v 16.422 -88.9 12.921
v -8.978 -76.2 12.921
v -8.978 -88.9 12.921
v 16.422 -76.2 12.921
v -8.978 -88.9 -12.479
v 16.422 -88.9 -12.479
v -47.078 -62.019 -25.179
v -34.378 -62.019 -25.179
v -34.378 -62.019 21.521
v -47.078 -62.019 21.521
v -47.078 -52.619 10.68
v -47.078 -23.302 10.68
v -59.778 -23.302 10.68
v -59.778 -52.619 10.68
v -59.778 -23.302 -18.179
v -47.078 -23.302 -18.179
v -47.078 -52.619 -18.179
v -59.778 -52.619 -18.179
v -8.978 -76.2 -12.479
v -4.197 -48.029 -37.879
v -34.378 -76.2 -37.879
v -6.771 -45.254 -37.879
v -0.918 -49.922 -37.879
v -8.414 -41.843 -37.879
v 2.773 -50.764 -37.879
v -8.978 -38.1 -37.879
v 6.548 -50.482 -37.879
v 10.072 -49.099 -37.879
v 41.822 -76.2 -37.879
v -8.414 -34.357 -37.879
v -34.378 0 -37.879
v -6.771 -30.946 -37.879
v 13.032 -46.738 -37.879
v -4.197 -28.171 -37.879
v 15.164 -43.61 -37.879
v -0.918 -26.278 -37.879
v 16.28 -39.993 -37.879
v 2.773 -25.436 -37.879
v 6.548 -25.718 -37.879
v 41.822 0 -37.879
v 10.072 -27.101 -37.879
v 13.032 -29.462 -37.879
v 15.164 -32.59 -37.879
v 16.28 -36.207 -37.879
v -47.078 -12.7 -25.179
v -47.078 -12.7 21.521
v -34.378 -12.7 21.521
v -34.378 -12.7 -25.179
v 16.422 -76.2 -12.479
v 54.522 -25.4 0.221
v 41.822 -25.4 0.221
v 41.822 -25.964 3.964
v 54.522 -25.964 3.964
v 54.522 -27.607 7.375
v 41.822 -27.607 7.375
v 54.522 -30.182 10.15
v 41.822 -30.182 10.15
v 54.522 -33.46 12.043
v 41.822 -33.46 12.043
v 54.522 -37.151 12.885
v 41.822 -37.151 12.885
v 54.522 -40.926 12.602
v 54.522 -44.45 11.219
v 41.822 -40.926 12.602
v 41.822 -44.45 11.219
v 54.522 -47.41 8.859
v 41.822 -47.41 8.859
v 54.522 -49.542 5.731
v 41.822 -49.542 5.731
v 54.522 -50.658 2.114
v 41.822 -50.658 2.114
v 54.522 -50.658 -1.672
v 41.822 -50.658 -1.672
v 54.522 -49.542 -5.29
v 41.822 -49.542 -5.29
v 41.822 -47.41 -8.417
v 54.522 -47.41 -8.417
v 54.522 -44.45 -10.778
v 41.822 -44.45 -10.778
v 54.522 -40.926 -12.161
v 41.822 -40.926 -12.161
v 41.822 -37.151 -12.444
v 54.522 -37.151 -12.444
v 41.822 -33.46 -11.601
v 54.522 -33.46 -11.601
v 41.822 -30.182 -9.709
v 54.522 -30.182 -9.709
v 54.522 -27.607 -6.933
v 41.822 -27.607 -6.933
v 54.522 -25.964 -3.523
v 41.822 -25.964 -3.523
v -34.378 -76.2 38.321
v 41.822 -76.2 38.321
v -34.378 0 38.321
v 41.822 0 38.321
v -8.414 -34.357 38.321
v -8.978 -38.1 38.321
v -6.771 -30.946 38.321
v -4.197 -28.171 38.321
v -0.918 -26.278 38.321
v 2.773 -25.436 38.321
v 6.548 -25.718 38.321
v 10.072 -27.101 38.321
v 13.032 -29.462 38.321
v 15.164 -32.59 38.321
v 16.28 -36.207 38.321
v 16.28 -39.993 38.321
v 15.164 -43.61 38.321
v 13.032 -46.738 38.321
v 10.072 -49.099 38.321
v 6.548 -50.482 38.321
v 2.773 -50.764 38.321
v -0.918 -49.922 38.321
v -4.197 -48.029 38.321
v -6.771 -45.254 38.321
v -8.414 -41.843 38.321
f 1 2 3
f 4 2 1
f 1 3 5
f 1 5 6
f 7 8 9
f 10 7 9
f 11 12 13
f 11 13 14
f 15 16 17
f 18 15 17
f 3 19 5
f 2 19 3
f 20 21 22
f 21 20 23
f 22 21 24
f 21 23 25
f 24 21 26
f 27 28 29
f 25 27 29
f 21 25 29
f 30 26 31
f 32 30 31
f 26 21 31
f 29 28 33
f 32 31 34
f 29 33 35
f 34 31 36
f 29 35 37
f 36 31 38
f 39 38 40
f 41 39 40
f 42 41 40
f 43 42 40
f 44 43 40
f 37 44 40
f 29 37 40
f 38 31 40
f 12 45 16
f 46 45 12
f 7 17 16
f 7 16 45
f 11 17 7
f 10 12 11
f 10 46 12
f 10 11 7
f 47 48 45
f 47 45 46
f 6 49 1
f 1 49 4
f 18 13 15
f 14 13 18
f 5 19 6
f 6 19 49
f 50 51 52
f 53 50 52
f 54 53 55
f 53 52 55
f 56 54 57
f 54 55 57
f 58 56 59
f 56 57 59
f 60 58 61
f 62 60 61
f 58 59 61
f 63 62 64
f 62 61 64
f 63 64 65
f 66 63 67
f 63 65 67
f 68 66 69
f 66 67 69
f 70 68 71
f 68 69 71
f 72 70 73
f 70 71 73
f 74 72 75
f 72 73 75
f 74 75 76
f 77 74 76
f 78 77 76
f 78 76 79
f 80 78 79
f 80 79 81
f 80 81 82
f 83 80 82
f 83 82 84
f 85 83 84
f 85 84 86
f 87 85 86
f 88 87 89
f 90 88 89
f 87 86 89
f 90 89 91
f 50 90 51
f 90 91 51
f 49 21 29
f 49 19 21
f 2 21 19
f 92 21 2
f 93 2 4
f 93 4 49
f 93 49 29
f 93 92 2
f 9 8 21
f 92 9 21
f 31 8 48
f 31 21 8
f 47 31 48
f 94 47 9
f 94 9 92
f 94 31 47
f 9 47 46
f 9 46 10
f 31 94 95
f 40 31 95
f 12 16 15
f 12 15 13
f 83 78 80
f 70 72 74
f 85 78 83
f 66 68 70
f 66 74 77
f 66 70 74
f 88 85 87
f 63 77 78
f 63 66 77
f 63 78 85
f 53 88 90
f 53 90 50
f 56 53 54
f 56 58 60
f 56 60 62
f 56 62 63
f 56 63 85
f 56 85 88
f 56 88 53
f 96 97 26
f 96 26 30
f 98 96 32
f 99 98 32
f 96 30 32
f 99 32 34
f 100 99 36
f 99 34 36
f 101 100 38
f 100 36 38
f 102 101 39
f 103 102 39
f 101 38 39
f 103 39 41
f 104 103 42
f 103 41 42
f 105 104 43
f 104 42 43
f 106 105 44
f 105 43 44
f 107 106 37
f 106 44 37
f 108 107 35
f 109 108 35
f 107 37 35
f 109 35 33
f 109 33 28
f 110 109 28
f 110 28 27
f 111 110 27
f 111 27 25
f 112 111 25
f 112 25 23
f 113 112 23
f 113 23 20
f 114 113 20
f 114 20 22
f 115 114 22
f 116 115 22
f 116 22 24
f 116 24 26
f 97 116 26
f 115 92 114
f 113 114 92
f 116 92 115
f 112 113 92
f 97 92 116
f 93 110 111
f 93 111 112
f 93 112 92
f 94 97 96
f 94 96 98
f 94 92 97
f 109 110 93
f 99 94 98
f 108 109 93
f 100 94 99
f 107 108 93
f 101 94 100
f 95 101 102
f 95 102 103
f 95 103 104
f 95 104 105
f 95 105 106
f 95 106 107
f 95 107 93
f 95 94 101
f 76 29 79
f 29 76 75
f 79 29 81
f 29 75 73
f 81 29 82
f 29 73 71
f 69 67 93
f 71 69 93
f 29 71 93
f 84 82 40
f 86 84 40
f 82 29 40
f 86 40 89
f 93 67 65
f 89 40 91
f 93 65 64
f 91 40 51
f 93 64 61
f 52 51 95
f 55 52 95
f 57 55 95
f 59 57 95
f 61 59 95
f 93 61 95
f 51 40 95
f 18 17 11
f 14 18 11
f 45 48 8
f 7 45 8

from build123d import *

# Parameters (mm, degrees)
F0_W      = 76.2
F0_H      = 76.2
F1_DEPTH  = 76.2
F2_W      = 25.4
F2_H      = 25.4
F3_DEPTH  = 12.7
F4_R      = 12.7
F5_DEPTH  = 12.7
F7_D      = 25.4
F8_W      = 49.319143
F8_H      = 46.700371
F9_DEPTH  = 12.7
F10_W     = 29.316643
F10_H     = 28.858568
F11_DEPTH = 12.7


with BuildPart() as f1:
    # F0 (on Front) → F1 (new body)
    with BuildSketch(Plane.XZ):
        with Locations((3.721774, 0.220706)):
            Rectangle(F0_W, F0_H)
    extrude(amount=F1_DEPTH)

    # F2 (on face) → F3 (join)
    with BuildSketch(Plane.XZ.offset(76.2)):
        with Locations((3.721774, 0.220706)):
            Rectangle(F2_W, F2_H)
    extrude(amount=F3_DEPTH)

    # F4 (on face) → F5 (join)
    with BuildSketch(Plane.YZ.offset(41.821774)):
        with Locations((-38.1, 0.220706)):
            Circle(F4_R)
    extrude(amount=F5_DEPTH)

    # F7 (through all)
    with Locations(Plane.XY.offset(38.320706)):
        with Locations((3.721774, -38.1)):
            Hole(F7_D / 2)

    # F8 (on face) → F9 (join)
    with BuildSketch(Plane(origin=(-34.378226, 0, 0), x_dir=(0, -1, 0), z_dir=(-1, 0, 0))):
        with Locations((37.359572, -1.829109)):
            Rectangle(F8_W, F8_H)
    extrude(amount=F9_DEPTH)

    # F10 (on face) → F11 (join)
    with BuildSketch(Plane(origin=(-47.078226, 0, 0), x_dir=(0, -1, 0), z_dir=(-1, 0, 0))):
        with Locations((37.96064, -3.749257)):
            Rectangle(F10_W, F10_H)
    extrude(amount=F11_DEPTH)


solid = f1.part
